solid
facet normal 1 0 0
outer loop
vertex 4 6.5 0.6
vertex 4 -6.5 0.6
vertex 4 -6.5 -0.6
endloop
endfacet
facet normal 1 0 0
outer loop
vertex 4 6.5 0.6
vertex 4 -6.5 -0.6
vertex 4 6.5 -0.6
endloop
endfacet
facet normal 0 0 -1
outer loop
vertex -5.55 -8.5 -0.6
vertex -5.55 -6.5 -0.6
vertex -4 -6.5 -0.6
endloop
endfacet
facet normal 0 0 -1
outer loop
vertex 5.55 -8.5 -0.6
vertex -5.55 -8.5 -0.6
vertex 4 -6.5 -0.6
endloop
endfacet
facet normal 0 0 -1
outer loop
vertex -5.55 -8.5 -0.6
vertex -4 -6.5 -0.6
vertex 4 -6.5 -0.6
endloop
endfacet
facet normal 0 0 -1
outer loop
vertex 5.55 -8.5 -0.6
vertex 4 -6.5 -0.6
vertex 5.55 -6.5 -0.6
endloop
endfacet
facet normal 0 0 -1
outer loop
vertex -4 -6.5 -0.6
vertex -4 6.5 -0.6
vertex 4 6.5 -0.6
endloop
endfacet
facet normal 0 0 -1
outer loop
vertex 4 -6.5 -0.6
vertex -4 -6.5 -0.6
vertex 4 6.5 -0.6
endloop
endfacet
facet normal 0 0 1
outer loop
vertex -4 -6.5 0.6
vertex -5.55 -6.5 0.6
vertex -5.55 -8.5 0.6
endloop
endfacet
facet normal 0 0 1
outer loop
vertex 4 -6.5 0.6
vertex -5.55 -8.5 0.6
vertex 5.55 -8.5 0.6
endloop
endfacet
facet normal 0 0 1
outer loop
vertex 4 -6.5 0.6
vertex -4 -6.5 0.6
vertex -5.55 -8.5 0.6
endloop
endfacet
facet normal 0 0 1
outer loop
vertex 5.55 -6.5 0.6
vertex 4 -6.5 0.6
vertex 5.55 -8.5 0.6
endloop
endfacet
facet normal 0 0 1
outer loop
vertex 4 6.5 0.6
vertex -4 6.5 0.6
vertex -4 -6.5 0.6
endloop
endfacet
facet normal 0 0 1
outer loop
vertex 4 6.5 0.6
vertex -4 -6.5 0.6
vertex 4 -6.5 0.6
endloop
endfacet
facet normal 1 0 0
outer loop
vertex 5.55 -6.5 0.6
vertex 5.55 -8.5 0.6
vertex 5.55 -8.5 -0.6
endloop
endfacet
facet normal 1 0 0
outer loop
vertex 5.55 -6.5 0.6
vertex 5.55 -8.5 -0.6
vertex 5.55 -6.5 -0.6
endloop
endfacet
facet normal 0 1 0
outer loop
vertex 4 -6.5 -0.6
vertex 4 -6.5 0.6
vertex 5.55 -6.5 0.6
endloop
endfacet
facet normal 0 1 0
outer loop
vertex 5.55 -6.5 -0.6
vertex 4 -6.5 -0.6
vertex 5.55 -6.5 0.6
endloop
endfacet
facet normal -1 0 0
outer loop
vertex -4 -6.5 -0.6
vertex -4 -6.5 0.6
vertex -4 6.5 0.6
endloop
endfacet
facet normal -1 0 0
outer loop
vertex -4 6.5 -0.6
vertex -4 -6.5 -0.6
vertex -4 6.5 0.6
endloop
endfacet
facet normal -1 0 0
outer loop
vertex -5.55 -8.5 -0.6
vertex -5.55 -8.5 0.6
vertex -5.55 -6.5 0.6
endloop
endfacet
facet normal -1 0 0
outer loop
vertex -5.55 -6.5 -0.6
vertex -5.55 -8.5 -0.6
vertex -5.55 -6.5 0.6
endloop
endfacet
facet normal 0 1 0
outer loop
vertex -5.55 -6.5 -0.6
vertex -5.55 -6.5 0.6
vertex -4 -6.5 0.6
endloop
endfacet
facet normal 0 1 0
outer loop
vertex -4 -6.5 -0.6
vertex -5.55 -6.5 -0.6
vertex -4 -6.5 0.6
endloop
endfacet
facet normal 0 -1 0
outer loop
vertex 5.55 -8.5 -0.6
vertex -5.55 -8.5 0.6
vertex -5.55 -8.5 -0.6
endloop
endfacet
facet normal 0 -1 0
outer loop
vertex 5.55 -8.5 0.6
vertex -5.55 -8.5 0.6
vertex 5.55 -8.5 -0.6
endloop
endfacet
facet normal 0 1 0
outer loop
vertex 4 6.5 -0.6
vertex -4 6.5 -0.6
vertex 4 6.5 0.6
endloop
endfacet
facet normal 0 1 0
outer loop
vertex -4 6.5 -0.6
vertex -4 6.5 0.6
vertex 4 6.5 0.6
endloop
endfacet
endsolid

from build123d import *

# Parameters (mm, degrees)
SKETCH1_W           = 8
SKETCH1_H           = 13
BOSS_EXTRUDE1_DEPTH = 0.6
SKETCH2_W           = 11.1
SKETCH2_H           = 2
BOSS_EXTRUDE2_DEPTH = 1.2


with BuildPart() as part:
    # Sketch1 → Boss-Extrude1 (new, symmetric)
    with BuildSketch(Plane.XY):
        Rectangle(SKETCH1_W, SKETCH1_H)
    extrude(amount=BOSS_EXTRUDE1_DEPTH, both=True)

    # Sketch2 → Boss-Extrude2 (add)
    with BuildSketch(Plane.XY.offset(0.6)):
        with Locations((0, -7.5)):
            Rectangle(SKETCH2_W, SKETCH2_H)
    extrude(amount=-BOSS_EXTRUDE2_DEPTH)


solid = part.part
